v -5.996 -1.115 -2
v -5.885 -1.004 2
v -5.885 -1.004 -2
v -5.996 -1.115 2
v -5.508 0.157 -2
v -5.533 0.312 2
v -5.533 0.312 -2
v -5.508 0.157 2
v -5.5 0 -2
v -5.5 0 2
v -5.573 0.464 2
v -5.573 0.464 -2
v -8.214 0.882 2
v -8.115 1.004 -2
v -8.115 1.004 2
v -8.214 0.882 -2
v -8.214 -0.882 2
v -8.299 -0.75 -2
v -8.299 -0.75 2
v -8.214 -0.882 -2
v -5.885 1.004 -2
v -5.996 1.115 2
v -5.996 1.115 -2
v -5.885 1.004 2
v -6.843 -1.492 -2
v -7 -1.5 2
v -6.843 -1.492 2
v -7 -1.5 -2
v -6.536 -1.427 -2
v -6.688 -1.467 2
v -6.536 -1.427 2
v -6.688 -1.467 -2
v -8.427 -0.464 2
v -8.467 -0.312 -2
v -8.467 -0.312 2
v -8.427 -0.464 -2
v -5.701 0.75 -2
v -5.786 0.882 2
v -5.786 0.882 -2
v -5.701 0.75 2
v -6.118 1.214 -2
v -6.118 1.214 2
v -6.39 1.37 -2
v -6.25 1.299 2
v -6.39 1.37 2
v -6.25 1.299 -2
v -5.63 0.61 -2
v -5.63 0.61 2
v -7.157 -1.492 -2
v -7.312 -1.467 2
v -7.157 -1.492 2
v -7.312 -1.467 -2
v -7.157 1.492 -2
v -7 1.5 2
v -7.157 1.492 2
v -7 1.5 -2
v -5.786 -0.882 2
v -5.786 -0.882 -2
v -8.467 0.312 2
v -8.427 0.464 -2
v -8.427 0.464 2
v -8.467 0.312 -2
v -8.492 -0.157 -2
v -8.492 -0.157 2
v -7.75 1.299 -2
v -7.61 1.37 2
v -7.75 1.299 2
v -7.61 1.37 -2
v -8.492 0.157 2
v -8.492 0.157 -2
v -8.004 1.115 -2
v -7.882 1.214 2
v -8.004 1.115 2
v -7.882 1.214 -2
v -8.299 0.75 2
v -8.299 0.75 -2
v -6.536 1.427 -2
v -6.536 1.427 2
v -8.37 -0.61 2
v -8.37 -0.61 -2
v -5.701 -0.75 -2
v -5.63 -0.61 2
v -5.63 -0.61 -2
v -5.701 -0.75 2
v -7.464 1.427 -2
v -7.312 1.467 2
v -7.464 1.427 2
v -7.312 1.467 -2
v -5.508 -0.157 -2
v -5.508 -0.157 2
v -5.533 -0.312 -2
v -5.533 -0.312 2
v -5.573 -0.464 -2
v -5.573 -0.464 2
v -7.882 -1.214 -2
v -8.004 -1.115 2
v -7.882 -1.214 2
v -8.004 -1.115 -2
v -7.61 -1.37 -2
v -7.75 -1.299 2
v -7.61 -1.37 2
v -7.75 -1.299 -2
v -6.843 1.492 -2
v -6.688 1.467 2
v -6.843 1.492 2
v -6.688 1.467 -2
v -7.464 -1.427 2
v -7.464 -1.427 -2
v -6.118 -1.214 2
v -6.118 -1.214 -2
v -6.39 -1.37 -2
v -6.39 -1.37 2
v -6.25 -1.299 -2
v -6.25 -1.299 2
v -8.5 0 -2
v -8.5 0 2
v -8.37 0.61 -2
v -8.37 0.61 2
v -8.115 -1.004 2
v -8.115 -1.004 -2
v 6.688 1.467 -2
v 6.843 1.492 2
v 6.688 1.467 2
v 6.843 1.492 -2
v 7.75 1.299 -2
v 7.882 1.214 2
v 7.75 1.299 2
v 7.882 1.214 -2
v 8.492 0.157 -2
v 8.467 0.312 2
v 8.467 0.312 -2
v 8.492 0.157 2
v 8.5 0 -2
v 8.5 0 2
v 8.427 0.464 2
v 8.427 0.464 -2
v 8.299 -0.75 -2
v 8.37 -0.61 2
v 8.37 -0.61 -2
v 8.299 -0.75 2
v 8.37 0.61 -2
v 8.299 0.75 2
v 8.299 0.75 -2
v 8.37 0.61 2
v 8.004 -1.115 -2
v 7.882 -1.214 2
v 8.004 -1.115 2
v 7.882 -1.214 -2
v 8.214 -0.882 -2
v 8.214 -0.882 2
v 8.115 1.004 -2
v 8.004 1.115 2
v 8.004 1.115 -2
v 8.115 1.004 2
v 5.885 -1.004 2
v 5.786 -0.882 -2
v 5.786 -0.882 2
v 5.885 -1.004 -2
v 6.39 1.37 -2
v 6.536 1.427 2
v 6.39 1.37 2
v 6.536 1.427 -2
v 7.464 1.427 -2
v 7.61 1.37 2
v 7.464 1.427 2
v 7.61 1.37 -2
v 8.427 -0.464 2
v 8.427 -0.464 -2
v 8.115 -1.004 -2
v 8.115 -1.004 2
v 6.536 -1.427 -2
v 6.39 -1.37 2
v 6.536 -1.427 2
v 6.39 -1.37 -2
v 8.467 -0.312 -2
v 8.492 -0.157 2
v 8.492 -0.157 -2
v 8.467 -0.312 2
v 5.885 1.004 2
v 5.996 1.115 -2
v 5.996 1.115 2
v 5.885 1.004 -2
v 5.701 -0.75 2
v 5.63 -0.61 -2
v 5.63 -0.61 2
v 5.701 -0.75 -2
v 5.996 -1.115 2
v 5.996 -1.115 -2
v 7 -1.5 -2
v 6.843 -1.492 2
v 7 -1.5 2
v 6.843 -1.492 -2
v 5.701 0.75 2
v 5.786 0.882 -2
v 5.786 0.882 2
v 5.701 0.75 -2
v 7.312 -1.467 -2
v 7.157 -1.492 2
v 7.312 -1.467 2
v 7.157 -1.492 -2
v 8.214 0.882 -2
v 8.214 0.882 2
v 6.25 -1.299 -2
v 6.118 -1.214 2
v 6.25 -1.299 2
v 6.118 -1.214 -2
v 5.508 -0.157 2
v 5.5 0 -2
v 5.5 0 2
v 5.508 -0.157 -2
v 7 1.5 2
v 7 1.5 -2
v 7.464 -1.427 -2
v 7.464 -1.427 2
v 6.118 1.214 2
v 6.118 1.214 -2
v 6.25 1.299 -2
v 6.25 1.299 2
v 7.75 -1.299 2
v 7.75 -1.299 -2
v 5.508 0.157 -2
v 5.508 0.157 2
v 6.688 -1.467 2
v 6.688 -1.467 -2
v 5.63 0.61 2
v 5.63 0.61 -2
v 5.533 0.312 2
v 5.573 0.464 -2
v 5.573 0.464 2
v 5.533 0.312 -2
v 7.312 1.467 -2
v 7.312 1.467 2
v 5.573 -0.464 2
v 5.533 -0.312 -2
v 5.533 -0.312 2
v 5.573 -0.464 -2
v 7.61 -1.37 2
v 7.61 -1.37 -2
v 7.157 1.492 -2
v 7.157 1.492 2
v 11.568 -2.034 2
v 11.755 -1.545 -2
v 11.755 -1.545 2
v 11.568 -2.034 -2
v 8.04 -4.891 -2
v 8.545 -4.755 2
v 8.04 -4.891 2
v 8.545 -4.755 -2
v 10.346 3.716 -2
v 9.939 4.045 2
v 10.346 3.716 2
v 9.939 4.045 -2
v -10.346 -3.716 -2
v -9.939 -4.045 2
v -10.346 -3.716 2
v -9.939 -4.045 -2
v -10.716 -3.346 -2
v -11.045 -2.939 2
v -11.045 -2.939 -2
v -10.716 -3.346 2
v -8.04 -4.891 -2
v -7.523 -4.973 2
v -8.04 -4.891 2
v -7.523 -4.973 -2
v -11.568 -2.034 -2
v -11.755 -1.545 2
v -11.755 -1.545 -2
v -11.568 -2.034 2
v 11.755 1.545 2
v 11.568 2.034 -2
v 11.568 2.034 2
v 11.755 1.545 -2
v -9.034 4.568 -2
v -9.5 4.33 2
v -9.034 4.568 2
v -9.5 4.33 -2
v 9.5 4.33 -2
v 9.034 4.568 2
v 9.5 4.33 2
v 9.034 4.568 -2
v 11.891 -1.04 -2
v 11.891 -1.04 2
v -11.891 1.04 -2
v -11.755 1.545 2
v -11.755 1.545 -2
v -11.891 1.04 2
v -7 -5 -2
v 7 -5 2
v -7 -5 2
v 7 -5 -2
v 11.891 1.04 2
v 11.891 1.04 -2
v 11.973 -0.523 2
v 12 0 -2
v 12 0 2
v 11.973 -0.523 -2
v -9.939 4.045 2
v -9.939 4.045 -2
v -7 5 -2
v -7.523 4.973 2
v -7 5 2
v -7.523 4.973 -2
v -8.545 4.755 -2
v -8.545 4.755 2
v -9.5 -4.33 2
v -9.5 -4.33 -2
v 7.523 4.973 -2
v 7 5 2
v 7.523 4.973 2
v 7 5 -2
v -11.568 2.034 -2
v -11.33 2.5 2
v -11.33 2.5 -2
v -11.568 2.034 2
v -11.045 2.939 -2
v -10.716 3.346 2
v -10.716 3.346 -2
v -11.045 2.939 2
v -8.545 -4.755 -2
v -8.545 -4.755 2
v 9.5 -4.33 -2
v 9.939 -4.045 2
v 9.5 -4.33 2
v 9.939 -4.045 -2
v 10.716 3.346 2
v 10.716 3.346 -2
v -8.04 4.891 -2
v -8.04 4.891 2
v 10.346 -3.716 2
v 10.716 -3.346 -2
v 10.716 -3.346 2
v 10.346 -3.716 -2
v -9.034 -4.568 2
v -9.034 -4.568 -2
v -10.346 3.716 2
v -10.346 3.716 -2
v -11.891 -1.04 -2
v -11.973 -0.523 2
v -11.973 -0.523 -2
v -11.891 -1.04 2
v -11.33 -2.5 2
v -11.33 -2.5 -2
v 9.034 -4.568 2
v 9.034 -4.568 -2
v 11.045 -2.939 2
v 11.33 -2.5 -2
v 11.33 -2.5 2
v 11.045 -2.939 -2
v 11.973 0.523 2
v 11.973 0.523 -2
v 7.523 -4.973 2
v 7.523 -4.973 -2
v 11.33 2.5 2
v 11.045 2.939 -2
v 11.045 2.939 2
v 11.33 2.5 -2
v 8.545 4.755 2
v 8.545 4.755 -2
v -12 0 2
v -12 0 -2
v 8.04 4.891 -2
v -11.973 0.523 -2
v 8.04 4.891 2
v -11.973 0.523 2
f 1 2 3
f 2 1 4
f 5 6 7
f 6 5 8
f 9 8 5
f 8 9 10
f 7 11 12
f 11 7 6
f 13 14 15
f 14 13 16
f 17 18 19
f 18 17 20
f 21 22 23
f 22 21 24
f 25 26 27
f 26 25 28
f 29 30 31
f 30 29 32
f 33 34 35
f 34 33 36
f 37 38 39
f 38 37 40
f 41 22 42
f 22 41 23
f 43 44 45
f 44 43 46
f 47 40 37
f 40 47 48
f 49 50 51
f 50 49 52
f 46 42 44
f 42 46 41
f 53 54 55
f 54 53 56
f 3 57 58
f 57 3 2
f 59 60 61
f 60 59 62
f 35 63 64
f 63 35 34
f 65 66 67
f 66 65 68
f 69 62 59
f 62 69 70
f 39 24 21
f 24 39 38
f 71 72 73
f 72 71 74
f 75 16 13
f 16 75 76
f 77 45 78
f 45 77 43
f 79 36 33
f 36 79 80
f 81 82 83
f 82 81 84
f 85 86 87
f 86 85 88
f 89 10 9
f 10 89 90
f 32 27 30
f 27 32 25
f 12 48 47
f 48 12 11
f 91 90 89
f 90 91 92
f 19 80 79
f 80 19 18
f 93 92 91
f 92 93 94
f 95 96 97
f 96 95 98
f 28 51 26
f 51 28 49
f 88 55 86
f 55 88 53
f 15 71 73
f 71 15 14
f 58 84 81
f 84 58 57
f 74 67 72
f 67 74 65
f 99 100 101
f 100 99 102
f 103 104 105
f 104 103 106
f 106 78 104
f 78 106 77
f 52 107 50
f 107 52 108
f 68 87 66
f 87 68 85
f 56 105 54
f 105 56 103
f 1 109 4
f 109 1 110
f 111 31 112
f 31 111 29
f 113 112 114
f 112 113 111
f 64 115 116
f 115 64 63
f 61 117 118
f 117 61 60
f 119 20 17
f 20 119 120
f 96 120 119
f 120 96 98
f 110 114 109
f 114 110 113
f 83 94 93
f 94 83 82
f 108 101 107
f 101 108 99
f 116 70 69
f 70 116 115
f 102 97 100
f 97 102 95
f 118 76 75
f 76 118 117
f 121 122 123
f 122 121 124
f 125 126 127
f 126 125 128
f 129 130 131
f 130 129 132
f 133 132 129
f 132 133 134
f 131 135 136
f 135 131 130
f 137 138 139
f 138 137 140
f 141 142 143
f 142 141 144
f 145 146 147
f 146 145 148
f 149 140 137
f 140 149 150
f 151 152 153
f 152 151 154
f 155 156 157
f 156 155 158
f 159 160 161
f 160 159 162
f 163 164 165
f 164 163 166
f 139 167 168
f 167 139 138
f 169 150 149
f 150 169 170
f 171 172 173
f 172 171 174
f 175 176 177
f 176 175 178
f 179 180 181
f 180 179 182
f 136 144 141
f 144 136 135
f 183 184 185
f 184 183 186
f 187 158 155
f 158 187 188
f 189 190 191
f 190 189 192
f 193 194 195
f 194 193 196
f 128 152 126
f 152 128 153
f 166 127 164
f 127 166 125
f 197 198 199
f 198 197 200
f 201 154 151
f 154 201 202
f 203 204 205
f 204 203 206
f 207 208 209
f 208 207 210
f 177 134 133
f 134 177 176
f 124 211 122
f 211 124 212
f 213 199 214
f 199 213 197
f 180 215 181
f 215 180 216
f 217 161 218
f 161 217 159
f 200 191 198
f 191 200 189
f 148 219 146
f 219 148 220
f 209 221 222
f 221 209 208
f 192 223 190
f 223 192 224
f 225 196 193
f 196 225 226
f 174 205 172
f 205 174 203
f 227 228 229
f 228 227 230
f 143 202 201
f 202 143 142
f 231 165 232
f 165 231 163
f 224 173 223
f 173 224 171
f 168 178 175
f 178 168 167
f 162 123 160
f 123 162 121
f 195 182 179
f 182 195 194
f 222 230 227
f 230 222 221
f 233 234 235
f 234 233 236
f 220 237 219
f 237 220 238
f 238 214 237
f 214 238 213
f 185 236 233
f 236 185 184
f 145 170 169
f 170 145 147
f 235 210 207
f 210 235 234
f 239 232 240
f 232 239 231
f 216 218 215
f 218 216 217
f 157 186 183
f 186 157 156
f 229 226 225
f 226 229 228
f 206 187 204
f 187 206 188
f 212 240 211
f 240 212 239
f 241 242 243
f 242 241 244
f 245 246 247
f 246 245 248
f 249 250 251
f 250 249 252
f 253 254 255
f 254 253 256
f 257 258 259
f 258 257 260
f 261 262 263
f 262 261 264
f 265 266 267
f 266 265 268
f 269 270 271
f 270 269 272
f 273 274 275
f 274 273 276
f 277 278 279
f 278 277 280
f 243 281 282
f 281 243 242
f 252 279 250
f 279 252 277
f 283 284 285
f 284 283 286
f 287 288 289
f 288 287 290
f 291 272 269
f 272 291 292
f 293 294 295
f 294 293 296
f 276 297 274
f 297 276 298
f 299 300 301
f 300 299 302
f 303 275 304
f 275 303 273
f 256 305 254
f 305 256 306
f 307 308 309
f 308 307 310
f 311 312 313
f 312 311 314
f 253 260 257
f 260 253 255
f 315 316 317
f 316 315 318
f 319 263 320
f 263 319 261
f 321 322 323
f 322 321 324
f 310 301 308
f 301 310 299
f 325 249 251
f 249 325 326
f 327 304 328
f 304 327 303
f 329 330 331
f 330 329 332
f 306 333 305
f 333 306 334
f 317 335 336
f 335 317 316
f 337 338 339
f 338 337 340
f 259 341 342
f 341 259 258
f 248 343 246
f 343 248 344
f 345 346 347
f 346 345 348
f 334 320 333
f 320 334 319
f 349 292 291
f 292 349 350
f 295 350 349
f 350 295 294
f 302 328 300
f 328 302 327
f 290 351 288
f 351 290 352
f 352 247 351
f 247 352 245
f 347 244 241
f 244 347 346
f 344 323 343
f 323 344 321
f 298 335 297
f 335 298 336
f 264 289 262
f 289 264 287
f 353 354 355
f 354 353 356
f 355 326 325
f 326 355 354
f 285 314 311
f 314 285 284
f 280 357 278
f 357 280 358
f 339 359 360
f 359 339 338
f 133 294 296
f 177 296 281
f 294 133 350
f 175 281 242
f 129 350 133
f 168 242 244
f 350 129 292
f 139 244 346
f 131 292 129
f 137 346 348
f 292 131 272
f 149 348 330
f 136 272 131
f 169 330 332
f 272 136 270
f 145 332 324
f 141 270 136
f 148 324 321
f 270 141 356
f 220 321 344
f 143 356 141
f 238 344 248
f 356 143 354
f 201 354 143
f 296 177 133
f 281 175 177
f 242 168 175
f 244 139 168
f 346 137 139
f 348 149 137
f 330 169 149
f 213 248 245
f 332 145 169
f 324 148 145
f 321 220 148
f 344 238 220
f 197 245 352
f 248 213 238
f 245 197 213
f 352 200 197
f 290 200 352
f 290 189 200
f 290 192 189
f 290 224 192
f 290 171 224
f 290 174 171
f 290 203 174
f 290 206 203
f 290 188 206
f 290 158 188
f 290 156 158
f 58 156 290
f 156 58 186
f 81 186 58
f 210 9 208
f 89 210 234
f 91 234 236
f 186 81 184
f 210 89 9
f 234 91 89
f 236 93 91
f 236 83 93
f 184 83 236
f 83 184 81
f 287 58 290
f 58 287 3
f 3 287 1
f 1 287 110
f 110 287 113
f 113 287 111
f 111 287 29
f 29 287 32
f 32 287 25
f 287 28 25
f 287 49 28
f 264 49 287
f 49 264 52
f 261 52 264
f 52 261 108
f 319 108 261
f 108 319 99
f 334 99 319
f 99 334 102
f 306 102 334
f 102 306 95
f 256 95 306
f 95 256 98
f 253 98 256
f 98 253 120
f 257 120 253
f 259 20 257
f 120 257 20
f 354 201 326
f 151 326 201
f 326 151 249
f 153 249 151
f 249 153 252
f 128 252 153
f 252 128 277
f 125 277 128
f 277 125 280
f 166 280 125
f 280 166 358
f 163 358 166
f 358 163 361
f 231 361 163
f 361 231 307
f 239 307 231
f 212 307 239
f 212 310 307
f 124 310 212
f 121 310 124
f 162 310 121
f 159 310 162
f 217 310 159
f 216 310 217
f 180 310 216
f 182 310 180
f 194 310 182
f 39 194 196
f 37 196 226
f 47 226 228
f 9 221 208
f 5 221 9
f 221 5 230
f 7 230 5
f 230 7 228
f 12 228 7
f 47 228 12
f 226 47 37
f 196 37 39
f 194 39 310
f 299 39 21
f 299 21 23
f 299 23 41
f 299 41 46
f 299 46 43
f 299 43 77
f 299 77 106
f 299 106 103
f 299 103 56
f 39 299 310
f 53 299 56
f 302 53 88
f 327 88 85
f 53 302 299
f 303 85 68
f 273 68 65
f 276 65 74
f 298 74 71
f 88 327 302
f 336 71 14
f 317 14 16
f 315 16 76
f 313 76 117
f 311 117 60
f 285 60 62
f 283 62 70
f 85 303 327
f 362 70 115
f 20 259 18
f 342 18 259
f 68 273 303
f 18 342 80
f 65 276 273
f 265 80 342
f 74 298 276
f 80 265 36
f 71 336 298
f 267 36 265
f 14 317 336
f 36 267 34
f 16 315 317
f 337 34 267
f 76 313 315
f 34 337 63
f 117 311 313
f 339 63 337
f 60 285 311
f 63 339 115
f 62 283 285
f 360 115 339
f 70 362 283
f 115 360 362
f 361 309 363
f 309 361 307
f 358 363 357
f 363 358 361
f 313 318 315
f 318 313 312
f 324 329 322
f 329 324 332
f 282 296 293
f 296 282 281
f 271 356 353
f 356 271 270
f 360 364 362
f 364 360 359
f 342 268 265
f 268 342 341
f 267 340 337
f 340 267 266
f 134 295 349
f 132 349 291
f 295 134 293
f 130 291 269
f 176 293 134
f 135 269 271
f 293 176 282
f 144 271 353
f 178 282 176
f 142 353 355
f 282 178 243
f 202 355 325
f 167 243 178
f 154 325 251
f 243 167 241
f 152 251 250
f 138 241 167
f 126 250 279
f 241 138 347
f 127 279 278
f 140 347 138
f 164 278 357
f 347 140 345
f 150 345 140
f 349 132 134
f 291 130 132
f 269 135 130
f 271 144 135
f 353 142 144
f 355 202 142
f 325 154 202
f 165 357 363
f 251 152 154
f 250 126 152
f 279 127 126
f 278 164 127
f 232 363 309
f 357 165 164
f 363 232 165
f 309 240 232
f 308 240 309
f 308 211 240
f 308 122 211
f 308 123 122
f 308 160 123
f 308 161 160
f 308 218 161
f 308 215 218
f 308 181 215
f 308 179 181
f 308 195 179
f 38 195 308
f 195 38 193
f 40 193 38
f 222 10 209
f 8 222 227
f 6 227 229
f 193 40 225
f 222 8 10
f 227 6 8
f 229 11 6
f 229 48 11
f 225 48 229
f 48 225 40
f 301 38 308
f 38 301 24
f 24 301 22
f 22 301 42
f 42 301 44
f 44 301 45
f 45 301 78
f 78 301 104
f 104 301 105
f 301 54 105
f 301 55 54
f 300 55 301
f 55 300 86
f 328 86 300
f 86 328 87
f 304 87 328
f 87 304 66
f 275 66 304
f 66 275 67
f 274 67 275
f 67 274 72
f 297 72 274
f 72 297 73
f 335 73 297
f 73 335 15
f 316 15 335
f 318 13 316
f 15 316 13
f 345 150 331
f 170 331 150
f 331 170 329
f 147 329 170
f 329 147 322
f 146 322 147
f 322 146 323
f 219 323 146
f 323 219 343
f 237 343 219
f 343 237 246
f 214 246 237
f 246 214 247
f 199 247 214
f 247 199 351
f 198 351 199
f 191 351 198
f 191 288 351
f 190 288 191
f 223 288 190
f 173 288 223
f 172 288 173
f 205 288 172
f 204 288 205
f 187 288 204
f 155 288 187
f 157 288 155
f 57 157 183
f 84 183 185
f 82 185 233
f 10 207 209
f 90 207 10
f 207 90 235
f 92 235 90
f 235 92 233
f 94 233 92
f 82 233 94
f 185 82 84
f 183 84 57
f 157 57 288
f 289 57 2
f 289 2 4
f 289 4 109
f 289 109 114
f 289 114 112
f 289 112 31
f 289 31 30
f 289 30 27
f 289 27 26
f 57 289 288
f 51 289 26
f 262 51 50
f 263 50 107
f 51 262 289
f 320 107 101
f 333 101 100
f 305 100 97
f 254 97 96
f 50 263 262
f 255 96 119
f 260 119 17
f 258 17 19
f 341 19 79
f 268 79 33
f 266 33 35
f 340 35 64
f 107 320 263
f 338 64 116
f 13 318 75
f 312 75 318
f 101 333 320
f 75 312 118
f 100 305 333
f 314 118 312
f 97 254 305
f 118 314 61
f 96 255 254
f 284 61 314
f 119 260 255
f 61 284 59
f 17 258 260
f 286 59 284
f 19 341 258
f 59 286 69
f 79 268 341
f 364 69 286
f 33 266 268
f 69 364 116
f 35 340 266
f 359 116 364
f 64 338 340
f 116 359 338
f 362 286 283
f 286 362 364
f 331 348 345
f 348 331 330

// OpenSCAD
// Two-hole link plate.
$fn = 60;
eps = 0.02;
hole_d = 3;
length = 24;
width = 10;
thickness = 4;
difference() { hull() { translate([-length/2+width/2,0,0]) cylinder(d=width,h=thickness,center=true); translate([length/2-width/2,0,0]) cylinder(d=width,h=thickness,center=true); } for(x=[-length/2+width/2,length/2-width/2]) translate([x,0,-thickness/2-eps]) cylinder(d=hole_d,h=thickness+2*eps); }
